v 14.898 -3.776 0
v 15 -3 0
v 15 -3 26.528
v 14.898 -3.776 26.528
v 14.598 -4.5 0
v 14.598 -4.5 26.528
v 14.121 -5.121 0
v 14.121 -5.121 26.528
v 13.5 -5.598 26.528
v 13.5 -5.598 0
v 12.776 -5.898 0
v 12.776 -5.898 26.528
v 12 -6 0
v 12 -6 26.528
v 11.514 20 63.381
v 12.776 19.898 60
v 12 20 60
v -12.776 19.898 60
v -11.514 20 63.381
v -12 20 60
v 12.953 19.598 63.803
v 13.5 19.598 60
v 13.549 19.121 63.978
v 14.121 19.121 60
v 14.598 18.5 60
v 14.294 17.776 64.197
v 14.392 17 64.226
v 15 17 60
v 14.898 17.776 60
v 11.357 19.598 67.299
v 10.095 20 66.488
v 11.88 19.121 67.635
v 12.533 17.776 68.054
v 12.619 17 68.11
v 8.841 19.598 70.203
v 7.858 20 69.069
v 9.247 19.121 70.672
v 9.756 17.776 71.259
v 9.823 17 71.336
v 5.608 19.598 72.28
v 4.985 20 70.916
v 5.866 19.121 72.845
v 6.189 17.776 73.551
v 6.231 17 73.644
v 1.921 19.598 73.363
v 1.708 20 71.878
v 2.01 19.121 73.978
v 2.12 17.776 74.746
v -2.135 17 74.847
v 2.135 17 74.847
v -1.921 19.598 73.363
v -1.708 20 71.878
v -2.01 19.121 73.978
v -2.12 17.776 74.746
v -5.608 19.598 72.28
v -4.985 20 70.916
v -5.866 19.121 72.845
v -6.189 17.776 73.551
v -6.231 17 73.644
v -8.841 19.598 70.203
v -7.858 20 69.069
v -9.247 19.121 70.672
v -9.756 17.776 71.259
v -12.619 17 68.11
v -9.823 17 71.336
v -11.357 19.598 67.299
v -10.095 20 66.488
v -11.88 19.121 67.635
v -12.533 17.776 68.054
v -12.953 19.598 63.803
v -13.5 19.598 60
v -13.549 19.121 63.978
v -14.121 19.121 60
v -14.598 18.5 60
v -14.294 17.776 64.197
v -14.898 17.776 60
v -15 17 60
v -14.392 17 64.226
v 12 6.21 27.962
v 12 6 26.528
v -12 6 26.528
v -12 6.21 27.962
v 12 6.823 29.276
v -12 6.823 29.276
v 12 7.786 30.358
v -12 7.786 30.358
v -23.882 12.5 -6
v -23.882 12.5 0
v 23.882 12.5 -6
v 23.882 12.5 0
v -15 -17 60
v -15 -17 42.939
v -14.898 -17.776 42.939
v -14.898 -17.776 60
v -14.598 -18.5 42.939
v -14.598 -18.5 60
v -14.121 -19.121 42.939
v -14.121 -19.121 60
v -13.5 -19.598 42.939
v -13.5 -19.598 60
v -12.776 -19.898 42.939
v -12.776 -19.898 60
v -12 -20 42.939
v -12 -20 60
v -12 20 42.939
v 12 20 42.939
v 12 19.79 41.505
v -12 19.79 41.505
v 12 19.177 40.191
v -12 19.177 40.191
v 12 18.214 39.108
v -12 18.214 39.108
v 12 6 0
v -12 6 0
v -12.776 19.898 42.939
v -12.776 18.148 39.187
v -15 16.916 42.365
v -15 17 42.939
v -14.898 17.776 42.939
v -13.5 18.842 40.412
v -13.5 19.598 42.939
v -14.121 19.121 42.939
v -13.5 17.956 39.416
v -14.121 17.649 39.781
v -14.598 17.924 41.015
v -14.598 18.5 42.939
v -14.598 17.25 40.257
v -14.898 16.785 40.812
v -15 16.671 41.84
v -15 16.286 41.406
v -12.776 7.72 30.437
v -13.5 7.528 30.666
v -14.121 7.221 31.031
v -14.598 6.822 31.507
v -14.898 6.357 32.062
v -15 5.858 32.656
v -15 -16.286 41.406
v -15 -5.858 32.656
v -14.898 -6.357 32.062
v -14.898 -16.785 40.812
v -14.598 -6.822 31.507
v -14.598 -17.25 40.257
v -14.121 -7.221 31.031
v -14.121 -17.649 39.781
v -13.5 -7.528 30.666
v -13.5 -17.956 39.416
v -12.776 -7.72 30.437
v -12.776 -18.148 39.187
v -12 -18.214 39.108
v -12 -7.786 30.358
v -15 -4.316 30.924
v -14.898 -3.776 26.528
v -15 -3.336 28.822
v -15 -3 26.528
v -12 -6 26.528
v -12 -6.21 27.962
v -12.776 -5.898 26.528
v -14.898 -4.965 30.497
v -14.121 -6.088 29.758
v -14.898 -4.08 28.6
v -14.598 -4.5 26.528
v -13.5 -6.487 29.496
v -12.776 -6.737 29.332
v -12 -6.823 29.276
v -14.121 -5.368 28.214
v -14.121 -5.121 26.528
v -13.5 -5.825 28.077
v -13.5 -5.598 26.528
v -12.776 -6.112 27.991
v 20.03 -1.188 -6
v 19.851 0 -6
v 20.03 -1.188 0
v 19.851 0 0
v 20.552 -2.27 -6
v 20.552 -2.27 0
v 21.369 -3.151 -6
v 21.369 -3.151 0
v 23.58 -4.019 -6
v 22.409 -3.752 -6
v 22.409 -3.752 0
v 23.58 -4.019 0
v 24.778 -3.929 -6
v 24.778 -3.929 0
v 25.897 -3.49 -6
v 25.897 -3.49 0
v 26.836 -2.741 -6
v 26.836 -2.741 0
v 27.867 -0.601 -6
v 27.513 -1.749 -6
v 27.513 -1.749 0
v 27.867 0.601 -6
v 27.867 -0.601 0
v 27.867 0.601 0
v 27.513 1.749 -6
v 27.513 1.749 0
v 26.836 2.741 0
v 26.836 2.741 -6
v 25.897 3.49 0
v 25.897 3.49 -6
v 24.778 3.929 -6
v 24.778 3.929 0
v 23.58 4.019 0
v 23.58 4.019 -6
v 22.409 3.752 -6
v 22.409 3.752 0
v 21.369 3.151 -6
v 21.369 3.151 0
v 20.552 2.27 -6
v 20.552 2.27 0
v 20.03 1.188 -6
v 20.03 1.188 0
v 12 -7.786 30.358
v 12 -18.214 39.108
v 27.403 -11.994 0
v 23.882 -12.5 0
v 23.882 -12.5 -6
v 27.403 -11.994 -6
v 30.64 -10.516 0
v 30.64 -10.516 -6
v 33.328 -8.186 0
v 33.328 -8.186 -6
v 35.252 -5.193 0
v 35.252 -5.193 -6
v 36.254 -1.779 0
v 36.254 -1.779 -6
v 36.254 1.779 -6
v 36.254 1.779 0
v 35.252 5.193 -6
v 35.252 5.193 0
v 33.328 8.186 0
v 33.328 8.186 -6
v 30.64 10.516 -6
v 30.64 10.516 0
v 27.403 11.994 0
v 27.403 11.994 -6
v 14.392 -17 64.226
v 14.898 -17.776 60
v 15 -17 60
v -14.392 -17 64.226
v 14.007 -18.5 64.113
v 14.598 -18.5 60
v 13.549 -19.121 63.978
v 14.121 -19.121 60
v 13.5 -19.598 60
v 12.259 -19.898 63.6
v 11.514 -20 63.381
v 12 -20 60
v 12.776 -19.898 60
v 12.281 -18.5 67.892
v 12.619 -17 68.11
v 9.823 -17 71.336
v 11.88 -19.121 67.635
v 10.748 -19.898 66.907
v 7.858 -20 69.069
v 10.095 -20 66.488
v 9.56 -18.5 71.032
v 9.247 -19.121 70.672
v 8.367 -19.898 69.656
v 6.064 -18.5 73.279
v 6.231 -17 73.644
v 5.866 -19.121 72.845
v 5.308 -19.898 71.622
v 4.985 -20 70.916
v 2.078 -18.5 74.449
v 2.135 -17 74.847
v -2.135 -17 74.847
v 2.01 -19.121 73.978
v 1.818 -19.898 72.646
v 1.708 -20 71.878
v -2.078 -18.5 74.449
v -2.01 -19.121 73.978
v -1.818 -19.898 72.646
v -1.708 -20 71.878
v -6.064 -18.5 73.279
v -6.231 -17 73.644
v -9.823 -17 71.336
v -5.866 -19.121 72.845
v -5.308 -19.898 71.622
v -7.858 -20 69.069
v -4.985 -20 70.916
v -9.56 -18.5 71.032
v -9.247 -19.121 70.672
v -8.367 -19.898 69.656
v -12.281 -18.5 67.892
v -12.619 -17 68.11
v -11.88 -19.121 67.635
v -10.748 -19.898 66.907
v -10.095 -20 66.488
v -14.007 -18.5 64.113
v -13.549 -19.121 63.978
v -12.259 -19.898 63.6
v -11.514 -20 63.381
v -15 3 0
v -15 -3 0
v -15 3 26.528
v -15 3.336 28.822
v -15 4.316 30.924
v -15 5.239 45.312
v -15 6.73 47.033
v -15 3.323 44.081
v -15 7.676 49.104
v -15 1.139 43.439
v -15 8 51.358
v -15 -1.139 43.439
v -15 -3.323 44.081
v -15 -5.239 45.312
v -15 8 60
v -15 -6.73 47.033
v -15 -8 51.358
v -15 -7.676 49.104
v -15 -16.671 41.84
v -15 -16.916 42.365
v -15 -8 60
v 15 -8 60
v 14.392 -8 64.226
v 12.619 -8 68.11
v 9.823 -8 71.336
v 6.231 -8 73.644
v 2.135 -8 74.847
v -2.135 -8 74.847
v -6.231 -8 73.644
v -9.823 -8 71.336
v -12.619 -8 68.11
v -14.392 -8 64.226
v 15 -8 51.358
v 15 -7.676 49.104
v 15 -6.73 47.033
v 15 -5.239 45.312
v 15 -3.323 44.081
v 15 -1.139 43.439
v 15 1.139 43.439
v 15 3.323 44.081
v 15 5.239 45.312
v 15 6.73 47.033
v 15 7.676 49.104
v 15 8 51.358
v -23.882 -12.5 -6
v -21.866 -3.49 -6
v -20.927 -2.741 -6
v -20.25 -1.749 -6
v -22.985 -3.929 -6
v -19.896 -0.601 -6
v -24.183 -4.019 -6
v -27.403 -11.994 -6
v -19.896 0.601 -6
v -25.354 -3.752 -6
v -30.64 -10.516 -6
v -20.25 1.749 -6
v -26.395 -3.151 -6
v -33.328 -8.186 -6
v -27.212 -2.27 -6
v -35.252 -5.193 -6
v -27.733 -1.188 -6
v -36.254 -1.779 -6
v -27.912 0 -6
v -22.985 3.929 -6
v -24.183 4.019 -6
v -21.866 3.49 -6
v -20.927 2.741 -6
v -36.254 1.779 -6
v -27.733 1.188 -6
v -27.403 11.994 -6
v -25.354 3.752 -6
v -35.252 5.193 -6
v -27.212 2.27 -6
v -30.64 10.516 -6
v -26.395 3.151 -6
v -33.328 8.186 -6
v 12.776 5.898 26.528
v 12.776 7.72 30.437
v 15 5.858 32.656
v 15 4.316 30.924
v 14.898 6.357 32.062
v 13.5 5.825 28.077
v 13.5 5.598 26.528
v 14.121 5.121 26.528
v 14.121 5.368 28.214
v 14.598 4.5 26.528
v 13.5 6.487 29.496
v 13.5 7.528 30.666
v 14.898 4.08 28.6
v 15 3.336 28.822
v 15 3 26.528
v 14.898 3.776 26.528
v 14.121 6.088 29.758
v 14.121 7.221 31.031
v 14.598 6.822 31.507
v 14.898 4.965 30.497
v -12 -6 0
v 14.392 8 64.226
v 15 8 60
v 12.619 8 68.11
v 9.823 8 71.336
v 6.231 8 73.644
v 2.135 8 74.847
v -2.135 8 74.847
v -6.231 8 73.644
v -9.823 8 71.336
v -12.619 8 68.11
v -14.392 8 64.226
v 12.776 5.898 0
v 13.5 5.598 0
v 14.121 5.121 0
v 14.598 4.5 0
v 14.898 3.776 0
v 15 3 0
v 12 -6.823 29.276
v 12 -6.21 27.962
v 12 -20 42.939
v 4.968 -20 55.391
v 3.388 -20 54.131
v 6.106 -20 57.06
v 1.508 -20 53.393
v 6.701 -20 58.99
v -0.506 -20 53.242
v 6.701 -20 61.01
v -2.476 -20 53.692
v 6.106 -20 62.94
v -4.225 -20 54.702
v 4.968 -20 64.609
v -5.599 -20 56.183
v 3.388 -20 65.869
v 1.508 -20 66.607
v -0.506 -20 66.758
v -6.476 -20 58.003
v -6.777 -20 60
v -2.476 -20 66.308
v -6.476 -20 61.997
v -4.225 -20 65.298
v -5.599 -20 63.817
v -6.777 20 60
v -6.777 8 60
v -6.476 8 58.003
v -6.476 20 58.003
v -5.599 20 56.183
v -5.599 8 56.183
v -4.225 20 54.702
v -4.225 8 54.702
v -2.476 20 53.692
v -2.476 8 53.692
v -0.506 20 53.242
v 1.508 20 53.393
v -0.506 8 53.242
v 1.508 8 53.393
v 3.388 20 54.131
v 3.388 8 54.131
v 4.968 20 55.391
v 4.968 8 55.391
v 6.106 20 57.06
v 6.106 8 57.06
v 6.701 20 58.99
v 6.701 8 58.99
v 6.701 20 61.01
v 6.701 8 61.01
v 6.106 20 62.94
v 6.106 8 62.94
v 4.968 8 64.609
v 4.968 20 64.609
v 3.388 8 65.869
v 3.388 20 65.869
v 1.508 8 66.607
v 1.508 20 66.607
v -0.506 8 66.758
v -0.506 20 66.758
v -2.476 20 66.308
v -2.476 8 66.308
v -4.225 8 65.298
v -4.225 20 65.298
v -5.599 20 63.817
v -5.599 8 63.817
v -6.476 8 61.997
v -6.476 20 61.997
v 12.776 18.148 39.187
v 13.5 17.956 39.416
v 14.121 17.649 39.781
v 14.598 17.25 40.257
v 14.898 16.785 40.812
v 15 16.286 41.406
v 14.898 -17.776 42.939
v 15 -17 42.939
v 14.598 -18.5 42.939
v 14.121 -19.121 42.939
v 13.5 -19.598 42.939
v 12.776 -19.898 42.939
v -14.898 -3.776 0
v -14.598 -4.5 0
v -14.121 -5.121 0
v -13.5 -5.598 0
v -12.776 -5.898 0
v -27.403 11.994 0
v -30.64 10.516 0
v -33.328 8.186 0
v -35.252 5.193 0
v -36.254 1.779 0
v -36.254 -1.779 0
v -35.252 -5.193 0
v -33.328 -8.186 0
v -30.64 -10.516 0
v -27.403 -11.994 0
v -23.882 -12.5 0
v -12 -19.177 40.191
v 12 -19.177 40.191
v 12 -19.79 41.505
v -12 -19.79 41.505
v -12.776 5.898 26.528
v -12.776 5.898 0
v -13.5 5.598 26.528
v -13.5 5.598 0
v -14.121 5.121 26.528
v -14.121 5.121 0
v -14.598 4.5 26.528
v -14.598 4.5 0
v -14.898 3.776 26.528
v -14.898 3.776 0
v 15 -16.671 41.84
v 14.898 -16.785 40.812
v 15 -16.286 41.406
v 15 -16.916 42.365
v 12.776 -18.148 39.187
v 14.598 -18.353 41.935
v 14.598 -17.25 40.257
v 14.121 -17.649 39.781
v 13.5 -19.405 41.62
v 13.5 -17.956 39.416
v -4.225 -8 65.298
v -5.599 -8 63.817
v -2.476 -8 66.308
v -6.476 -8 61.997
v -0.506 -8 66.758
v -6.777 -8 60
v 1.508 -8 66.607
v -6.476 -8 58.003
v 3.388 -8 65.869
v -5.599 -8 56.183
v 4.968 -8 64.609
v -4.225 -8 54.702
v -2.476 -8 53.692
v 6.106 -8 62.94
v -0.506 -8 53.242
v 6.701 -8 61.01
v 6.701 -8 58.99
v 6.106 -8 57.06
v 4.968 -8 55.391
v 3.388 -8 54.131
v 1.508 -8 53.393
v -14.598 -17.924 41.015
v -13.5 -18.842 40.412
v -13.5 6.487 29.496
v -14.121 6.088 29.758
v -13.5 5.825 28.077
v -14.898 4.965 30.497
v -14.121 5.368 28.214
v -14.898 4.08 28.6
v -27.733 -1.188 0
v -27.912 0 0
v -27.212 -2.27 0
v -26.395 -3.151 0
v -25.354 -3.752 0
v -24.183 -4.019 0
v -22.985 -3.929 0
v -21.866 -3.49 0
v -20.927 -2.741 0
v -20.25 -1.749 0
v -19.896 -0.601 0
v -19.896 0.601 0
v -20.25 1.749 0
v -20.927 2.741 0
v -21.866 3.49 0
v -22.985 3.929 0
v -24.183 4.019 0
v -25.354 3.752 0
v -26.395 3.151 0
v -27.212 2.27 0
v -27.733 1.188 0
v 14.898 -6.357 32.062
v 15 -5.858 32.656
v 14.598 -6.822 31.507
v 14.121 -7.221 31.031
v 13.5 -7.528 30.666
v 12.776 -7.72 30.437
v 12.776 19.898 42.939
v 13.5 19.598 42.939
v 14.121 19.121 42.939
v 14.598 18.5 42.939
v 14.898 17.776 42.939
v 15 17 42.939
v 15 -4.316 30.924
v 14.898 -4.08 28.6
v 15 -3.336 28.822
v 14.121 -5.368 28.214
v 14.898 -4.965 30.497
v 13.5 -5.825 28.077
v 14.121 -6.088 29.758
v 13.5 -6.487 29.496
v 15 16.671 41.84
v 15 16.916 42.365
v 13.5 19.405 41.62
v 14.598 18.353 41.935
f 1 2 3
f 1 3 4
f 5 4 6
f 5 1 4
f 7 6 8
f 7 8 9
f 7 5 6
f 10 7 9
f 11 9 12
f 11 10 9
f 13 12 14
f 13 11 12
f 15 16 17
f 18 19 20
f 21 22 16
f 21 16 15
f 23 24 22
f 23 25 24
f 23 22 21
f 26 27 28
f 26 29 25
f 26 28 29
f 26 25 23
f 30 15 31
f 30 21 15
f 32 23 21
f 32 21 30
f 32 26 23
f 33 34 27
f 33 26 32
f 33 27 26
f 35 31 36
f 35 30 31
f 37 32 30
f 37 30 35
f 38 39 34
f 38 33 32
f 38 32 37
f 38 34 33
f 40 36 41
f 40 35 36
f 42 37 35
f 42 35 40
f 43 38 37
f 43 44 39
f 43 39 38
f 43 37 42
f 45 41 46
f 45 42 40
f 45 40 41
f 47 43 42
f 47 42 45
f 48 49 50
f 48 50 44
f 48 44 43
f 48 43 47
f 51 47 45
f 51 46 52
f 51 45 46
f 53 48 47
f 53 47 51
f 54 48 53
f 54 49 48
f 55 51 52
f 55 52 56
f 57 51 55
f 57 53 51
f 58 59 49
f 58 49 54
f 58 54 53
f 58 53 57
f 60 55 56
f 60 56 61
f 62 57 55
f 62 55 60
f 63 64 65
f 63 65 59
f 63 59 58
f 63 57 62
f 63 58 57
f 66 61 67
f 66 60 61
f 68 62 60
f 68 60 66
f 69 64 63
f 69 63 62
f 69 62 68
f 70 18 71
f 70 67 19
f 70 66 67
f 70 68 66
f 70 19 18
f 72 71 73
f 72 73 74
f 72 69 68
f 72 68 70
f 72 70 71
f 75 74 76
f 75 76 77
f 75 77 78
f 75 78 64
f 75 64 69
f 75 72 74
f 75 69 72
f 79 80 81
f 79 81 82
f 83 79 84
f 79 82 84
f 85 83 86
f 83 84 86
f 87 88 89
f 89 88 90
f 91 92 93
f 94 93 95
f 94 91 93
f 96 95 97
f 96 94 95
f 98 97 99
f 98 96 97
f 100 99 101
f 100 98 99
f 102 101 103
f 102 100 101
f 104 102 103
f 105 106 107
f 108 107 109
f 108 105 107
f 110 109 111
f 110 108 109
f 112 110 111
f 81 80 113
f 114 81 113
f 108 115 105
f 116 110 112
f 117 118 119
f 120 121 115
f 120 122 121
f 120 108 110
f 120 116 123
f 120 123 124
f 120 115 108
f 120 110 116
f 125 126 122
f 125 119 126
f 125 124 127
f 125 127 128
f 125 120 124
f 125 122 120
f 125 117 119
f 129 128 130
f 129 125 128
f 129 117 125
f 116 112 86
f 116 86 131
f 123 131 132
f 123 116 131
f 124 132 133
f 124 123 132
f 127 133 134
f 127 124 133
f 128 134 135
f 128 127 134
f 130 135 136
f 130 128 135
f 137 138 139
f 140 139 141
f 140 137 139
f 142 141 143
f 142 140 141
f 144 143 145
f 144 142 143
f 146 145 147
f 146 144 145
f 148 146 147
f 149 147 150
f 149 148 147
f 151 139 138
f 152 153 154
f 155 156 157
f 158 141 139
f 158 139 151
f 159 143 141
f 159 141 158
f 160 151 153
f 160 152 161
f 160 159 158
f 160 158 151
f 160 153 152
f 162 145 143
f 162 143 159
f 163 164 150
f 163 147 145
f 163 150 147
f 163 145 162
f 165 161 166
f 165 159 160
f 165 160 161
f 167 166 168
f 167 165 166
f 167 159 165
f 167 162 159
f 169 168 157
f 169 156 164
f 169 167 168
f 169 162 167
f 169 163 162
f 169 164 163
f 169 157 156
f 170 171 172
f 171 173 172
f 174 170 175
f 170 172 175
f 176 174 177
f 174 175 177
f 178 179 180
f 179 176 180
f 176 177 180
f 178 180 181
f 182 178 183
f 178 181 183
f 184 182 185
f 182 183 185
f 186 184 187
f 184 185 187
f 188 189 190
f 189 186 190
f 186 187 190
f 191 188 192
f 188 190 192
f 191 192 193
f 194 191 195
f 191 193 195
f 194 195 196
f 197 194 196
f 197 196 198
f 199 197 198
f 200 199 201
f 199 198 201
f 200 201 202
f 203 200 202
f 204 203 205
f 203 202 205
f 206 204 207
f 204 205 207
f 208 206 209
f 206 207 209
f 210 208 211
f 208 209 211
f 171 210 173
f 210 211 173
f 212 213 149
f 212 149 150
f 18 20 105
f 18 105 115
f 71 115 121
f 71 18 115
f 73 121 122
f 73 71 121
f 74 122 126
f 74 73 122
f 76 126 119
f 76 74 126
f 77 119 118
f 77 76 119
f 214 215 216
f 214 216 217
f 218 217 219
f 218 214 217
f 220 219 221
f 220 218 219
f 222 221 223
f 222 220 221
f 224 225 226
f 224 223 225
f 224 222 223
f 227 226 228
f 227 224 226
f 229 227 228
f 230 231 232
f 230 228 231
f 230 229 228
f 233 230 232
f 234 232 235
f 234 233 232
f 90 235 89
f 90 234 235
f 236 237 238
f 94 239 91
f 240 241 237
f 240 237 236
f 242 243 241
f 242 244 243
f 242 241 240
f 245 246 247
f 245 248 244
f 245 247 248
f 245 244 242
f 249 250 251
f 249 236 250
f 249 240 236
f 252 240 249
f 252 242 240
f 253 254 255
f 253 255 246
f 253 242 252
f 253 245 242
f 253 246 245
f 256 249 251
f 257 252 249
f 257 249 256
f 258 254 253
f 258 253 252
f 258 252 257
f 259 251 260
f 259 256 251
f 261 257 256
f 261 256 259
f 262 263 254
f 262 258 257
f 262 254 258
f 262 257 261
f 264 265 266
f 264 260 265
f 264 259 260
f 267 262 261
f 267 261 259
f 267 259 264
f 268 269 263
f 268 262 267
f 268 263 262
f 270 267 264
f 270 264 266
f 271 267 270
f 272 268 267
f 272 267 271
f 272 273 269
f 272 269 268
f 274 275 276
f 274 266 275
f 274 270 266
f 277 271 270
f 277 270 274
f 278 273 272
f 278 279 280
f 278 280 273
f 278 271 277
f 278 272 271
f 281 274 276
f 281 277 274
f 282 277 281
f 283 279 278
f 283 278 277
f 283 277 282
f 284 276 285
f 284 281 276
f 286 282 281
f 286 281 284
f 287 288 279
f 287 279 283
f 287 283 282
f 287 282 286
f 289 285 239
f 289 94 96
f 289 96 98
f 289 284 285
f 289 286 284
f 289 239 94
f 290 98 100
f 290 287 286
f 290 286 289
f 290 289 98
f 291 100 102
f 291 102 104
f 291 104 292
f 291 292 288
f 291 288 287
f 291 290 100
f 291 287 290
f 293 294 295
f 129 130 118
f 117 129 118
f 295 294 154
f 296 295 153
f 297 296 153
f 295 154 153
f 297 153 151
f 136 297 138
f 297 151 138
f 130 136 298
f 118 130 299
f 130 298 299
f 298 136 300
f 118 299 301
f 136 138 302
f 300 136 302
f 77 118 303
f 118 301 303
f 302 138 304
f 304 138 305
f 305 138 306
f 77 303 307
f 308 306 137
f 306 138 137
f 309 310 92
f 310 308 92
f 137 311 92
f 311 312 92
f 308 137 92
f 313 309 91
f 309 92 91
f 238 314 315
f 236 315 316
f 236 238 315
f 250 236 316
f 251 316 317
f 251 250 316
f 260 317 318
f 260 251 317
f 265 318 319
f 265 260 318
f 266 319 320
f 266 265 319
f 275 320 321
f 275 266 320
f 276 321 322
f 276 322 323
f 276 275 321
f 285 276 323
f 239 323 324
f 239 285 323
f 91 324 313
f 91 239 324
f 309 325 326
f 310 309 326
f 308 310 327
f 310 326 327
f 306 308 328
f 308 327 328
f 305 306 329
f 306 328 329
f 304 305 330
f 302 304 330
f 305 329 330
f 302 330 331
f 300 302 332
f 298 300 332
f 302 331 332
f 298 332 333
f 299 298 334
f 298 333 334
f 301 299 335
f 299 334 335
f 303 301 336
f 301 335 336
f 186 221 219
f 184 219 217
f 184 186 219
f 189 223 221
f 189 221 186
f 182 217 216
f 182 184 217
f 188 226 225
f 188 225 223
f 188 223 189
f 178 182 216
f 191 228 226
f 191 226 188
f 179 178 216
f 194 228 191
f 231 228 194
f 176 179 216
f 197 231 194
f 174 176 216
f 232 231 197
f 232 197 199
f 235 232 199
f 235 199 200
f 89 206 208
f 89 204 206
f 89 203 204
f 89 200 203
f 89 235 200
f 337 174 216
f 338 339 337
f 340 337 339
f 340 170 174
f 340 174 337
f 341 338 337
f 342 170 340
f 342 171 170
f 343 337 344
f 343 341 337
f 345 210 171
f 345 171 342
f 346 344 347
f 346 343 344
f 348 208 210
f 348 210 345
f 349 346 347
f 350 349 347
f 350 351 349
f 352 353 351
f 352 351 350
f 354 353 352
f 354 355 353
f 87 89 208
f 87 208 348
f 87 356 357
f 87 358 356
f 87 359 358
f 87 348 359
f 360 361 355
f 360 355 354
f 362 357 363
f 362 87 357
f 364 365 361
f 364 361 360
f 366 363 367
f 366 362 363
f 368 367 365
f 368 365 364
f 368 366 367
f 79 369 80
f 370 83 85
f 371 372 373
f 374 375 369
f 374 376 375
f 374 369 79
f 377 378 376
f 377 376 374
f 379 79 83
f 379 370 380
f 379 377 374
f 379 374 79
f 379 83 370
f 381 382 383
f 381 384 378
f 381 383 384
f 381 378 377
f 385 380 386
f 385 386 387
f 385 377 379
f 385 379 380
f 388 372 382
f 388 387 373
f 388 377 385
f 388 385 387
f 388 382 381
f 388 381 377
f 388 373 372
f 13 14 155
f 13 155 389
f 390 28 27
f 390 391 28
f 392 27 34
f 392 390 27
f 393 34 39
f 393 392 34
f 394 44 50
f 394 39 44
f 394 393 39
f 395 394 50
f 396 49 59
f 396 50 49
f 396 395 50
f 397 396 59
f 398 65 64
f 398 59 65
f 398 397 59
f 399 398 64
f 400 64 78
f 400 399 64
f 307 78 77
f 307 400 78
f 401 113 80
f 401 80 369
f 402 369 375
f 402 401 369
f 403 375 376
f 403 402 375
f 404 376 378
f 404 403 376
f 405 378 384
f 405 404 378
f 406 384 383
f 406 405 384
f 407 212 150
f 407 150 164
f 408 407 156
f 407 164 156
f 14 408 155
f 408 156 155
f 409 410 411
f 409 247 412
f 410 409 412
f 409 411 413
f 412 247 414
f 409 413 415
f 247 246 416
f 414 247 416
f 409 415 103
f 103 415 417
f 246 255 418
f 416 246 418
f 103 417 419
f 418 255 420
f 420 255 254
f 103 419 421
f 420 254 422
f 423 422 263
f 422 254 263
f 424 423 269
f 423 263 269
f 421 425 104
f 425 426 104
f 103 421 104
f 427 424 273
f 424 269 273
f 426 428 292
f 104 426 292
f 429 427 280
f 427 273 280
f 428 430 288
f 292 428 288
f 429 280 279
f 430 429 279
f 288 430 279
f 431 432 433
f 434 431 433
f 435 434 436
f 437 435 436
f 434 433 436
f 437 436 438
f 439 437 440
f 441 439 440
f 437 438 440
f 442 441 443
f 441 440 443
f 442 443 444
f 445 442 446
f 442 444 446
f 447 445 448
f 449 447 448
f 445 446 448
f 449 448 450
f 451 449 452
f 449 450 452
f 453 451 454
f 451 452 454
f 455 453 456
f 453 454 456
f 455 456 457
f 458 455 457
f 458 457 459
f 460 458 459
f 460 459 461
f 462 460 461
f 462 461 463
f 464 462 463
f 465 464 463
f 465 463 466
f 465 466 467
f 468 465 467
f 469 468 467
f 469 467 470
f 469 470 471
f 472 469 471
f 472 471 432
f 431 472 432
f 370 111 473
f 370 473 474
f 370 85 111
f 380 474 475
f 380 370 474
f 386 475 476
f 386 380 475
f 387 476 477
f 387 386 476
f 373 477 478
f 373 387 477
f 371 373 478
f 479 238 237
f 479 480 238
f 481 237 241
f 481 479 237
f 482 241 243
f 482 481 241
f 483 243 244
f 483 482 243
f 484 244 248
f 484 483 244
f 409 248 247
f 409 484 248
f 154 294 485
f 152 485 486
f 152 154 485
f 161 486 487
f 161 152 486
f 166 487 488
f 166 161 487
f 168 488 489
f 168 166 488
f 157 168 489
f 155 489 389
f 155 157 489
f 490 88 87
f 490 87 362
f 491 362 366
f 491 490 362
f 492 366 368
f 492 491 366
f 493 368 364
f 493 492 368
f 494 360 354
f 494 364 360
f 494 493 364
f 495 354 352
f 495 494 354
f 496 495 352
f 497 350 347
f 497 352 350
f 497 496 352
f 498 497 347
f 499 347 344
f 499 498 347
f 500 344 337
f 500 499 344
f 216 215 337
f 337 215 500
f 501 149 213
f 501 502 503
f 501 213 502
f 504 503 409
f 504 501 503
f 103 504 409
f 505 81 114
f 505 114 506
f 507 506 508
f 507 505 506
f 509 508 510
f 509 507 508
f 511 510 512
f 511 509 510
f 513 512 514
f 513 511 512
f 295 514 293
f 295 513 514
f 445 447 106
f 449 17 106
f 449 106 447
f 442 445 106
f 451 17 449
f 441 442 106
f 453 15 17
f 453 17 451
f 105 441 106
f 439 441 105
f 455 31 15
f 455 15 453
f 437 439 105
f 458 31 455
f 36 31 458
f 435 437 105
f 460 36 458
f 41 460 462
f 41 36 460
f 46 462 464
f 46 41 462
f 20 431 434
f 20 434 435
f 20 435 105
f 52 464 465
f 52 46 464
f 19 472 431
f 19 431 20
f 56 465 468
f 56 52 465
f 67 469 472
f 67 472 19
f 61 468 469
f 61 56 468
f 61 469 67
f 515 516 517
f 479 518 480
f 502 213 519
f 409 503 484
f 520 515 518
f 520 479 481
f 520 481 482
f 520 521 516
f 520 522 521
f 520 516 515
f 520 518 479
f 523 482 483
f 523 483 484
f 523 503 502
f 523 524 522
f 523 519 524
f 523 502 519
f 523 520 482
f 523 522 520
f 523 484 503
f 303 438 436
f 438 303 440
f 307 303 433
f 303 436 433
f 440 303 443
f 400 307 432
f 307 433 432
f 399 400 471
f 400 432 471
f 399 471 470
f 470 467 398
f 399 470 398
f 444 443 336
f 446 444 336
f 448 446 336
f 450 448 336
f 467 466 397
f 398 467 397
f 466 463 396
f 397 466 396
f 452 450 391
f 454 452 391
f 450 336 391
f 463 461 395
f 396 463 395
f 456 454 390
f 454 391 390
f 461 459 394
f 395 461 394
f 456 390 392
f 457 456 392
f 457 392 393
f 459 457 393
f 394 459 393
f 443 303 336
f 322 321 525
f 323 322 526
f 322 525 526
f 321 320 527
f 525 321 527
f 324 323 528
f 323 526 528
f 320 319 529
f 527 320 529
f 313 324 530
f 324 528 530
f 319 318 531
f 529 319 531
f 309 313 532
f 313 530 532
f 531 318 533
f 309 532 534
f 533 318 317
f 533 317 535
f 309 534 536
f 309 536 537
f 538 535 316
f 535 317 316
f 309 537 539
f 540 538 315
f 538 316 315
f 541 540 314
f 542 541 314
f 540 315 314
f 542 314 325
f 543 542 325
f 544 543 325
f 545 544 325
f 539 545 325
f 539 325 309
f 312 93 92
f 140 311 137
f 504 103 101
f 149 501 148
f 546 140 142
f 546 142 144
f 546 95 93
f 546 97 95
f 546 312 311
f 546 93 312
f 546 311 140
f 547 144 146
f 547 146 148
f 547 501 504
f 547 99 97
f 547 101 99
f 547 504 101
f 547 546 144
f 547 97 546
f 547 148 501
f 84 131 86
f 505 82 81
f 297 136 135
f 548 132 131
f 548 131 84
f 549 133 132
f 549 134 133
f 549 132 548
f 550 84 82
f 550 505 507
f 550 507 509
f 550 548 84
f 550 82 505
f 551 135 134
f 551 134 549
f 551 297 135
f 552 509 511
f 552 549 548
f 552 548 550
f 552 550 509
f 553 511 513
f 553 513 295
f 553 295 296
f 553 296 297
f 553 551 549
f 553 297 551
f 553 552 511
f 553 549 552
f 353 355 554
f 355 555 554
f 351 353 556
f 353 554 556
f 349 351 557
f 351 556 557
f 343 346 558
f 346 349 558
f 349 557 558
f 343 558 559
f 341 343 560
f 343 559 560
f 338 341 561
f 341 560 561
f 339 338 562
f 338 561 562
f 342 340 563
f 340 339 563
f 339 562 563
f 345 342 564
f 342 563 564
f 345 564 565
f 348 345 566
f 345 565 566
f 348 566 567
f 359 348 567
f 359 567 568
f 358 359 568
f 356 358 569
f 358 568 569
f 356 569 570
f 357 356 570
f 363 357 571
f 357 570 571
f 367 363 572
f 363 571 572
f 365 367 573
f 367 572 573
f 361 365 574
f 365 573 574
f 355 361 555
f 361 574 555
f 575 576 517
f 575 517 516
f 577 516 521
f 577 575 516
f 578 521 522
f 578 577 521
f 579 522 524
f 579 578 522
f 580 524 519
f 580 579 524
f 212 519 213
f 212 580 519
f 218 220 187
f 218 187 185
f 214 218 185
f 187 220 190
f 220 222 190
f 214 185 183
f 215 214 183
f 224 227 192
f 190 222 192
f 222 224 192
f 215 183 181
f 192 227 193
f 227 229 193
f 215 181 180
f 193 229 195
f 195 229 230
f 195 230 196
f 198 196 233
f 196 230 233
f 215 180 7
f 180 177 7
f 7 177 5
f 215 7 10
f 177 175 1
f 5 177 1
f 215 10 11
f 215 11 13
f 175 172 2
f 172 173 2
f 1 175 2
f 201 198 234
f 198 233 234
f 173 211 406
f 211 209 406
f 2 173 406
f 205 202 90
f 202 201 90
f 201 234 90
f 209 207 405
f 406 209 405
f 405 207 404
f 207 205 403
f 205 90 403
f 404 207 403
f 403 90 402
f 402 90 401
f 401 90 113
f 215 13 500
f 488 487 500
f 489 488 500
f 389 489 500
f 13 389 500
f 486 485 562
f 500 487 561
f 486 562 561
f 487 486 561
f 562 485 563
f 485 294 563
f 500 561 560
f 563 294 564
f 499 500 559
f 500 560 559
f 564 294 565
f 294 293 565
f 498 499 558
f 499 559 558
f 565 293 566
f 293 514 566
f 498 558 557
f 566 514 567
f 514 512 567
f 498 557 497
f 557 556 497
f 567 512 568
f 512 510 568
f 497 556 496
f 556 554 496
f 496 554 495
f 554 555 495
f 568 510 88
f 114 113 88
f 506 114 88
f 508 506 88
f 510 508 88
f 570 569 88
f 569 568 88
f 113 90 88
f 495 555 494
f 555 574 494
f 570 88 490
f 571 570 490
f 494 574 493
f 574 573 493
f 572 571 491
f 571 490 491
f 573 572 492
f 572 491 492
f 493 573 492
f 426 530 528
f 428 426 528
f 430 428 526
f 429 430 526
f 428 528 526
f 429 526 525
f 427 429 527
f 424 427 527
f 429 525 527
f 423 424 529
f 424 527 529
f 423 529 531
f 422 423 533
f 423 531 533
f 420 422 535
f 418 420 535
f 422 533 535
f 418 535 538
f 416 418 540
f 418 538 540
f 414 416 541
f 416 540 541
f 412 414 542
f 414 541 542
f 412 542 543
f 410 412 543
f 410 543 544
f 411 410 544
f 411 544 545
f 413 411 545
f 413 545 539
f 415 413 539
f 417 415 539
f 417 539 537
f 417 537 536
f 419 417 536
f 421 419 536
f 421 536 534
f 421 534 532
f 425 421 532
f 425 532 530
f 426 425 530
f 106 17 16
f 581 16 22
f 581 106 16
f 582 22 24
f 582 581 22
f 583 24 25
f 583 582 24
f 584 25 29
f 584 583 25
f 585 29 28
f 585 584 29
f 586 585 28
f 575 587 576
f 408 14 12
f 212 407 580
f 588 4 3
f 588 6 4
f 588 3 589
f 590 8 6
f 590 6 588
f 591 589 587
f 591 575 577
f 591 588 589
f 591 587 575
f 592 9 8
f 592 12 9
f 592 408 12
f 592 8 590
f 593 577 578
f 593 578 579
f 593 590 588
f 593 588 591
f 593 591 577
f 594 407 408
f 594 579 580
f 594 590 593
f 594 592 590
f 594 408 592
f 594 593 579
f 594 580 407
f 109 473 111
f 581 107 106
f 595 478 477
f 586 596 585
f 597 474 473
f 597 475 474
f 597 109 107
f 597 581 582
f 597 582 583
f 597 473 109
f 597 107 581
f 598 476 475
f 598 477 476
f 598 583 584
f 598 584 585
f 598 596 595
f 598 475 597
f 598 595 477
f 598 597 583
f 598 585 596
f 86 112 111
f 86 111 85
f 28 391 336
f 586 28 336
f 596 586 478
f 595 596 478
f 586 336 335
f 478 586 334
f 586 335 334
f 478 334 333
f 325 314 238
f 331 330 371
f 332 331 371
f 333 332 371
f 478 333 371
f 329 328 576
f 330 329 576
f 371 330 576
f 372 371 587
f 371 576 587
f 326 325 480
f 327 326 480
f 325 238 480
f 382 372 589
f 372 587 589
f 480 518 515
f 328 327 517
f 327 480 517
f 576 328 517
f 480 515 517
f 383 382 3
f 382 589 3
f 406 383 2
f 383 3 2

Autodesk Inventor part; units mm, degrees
ref_plane "YZ Plane" through (0, 0, 0) normal (1, 0, 0) x (0, 1, 0)
ref_plane "XZ Plane" through (0, 0, 0) normal (0, 1, 0) x (-1, 0, 0)
ref_plane "XY Plane" through (0, 0, 0) normal (0, 0, 1) x (1, 0, 0)
sketch "Sketch1" plane through (0, 0, 0) normal (0, 1, 0) x (-1, 0, 0)
  arc A0 (15, 60) -> (-15, 60) centre (0, 60) ccw
  line L0 (-15, 60) -> (-15, 0)
  line L1 (-15, 0) -> (15, 0)
  line L2 (15, 0) -> (15, 60)
  line L3 (21, 0) -> (-21, 0) projected
  line L4 (0, -15) -> (0, 90) projected
  circle A1 centre (0, 60) radius 6.7766
  point P0 (0, 0)
  dimension "d0" = 30
  dimension "d1" = 60
  dimension "d2" = 15
extrude "Extrusion1" add sketch "Sketch1" along normal mid plane 40 contours L2 L1 L4 A1 A0 | L4 A1 L1 L0 A0
sketch "Sketch2" plane through (15, -20, 0) normal (1, 0, 0) x (0, 0, -1)
  line L0 (0, 0) -> (0, 40) projected
  line L1 (-60, 40) -> (0, 40) projected
  line L2 (0, 0) -> (-60, 0) projected
  line L3 (-60, 40) -> (-60, 40) projected
  line L4 (-60, 0) -> (-60, 0) projected
  line L5 (-75, 0) -> (-75, 40) projected
  line L6 (-75, 12) -> (-51.3579, 12)
  line L7 (-51.3579, 28) -> (-75, 28)
  line L8 (-75, 28) -> (-75, 12)
  line L9 (-53.2234, 0) -> (-66.7766, 0) projected
  line L10 (-93.6547, 20) -> (5.2074, 20) construction
  line L11 (-40.607, 0) -> (-28.8596, 14)
  line L12 (-28.8596, 14) -> (0, 14)
  line L13 (0, 0) -> (0, 40) construction
  line L14 (-40.607, 40) -> (-28.8596, 26)
  line L15 (-28.8596, 26) -> (0, 26)
  line L16 (0, 0) -> (-60, 0) construction
  line L17 (-60, 40) -> (0, 40) construction
  arc A0 (-51.3579, 12) -> (-51.3579, 28) centre (-51.3579, 20) ccw
  line L18 (-53.2234, 0) -> (-66.7766, 0) projected
  line L19 (-66.7766, 40) -> (-53.2234, 40) projected
  line L20 (-53.2234, 40) -> (-53.2234, 0) projected
  point P0 (0, 20)
  point P1 (-75, 20)
  point P2 (0, 20)
  point P3 (-40.607, 0)
  dimension "d5" = 130
  dimension "d6" = 12
  dimension "d7" = 16
  dimension "d8" = 8
extrude "Extrusion2" cut sketch "Sketch2" against normal blind 40 contours L2 L11 L12 L0 | L15 L14 L1 L0 | L20 L7 A0 L6 | L6 L5 L7 L20
fillet "Fillet1" radius 5 4 edges at (0, -20, 40.607) (0, -6, 28.8596) (0, 6, 28.8596) (0, 20, 40.607)
fillet "Fillet2" radius 3 22 edges at (-15, -20, 51.4693) (-15, -19.5315, 40.8254) (-15, -13, 34.7333) (-15, -6.4685, 28.6411) (-15, -6, 13.264) (15, -20, 51.4693) (15, -19.5315, 40.8254) (15, -13, 34.7333) (15, -6.4685, 28.6411) (15, -6, 13.264) (0, -20, 75) (15, 20, 51.4693) (15, 19.5315, 40.8254) (15, 13, 34.7333) (15, 6.4685, 28.6411) (15, 6, 13.264) (-15, 20, 51.4693) (-15, 19.5315, 40.8254) (-15, 13, 34.7333) (-15, 6.4685, 28.6411) (-15, 6, 13.264) (0, 20, 75)
sketch "Sketch3" plane through (12, -6, 0) normal (0, 0, -1) x (-1, 0, 0)
  arc A0 (0, 12) -> (-3, 9) centre (0, 9) ccw projected
  line L0 (-3, 3) -> (-3, 9) projected
  arc A1 (-3, 3) -> (0, 0) centre (0, 3) ccw projected
  line L1 (0, 0) -> (24, 0) projected
  arc A2 (24, 0) -> (27, 3) centre (24, 3) ccw projected
  line L2 (27, 9) -> (27, 3) projected
  arc A3 (27, 9) -> (24, 12) centre (24, 9) ccw projected
  line L3 (24, 12) -> (0, 12) projected
  line L4 (-11.8816, 6) -> (35.8816, 6) construction
  line L5 (-11.8816, -6.5) -> (35.8816, -6.5)
  line L6 (35.8816, 18.5) -> (-11.8816, 18.5)
  arc A4 (-11.8816, 18.5) -> (-11.8816, -6.5) centre (-11.8816, 6) ccw
  arc A5 (35.8816, -6.5) -> (35.8816, 18.5) centre (35.8816, 6) ccw
  circle A6 centre (35.8816, 6) radius 4.0304
  circle A7 centre (-11.8816, 6) radius 4.0304
  point P0 (12, 6)
  point P1 (12, 6)
  dimension "d13" = 25
extrude "Extrusion3" add sketch "Sketch3" along normal blind 6 contours L3 A3 L2 A2 L1 A1 L0 A0 | A4 L6 A5 L5
properties part number "Fitting"
